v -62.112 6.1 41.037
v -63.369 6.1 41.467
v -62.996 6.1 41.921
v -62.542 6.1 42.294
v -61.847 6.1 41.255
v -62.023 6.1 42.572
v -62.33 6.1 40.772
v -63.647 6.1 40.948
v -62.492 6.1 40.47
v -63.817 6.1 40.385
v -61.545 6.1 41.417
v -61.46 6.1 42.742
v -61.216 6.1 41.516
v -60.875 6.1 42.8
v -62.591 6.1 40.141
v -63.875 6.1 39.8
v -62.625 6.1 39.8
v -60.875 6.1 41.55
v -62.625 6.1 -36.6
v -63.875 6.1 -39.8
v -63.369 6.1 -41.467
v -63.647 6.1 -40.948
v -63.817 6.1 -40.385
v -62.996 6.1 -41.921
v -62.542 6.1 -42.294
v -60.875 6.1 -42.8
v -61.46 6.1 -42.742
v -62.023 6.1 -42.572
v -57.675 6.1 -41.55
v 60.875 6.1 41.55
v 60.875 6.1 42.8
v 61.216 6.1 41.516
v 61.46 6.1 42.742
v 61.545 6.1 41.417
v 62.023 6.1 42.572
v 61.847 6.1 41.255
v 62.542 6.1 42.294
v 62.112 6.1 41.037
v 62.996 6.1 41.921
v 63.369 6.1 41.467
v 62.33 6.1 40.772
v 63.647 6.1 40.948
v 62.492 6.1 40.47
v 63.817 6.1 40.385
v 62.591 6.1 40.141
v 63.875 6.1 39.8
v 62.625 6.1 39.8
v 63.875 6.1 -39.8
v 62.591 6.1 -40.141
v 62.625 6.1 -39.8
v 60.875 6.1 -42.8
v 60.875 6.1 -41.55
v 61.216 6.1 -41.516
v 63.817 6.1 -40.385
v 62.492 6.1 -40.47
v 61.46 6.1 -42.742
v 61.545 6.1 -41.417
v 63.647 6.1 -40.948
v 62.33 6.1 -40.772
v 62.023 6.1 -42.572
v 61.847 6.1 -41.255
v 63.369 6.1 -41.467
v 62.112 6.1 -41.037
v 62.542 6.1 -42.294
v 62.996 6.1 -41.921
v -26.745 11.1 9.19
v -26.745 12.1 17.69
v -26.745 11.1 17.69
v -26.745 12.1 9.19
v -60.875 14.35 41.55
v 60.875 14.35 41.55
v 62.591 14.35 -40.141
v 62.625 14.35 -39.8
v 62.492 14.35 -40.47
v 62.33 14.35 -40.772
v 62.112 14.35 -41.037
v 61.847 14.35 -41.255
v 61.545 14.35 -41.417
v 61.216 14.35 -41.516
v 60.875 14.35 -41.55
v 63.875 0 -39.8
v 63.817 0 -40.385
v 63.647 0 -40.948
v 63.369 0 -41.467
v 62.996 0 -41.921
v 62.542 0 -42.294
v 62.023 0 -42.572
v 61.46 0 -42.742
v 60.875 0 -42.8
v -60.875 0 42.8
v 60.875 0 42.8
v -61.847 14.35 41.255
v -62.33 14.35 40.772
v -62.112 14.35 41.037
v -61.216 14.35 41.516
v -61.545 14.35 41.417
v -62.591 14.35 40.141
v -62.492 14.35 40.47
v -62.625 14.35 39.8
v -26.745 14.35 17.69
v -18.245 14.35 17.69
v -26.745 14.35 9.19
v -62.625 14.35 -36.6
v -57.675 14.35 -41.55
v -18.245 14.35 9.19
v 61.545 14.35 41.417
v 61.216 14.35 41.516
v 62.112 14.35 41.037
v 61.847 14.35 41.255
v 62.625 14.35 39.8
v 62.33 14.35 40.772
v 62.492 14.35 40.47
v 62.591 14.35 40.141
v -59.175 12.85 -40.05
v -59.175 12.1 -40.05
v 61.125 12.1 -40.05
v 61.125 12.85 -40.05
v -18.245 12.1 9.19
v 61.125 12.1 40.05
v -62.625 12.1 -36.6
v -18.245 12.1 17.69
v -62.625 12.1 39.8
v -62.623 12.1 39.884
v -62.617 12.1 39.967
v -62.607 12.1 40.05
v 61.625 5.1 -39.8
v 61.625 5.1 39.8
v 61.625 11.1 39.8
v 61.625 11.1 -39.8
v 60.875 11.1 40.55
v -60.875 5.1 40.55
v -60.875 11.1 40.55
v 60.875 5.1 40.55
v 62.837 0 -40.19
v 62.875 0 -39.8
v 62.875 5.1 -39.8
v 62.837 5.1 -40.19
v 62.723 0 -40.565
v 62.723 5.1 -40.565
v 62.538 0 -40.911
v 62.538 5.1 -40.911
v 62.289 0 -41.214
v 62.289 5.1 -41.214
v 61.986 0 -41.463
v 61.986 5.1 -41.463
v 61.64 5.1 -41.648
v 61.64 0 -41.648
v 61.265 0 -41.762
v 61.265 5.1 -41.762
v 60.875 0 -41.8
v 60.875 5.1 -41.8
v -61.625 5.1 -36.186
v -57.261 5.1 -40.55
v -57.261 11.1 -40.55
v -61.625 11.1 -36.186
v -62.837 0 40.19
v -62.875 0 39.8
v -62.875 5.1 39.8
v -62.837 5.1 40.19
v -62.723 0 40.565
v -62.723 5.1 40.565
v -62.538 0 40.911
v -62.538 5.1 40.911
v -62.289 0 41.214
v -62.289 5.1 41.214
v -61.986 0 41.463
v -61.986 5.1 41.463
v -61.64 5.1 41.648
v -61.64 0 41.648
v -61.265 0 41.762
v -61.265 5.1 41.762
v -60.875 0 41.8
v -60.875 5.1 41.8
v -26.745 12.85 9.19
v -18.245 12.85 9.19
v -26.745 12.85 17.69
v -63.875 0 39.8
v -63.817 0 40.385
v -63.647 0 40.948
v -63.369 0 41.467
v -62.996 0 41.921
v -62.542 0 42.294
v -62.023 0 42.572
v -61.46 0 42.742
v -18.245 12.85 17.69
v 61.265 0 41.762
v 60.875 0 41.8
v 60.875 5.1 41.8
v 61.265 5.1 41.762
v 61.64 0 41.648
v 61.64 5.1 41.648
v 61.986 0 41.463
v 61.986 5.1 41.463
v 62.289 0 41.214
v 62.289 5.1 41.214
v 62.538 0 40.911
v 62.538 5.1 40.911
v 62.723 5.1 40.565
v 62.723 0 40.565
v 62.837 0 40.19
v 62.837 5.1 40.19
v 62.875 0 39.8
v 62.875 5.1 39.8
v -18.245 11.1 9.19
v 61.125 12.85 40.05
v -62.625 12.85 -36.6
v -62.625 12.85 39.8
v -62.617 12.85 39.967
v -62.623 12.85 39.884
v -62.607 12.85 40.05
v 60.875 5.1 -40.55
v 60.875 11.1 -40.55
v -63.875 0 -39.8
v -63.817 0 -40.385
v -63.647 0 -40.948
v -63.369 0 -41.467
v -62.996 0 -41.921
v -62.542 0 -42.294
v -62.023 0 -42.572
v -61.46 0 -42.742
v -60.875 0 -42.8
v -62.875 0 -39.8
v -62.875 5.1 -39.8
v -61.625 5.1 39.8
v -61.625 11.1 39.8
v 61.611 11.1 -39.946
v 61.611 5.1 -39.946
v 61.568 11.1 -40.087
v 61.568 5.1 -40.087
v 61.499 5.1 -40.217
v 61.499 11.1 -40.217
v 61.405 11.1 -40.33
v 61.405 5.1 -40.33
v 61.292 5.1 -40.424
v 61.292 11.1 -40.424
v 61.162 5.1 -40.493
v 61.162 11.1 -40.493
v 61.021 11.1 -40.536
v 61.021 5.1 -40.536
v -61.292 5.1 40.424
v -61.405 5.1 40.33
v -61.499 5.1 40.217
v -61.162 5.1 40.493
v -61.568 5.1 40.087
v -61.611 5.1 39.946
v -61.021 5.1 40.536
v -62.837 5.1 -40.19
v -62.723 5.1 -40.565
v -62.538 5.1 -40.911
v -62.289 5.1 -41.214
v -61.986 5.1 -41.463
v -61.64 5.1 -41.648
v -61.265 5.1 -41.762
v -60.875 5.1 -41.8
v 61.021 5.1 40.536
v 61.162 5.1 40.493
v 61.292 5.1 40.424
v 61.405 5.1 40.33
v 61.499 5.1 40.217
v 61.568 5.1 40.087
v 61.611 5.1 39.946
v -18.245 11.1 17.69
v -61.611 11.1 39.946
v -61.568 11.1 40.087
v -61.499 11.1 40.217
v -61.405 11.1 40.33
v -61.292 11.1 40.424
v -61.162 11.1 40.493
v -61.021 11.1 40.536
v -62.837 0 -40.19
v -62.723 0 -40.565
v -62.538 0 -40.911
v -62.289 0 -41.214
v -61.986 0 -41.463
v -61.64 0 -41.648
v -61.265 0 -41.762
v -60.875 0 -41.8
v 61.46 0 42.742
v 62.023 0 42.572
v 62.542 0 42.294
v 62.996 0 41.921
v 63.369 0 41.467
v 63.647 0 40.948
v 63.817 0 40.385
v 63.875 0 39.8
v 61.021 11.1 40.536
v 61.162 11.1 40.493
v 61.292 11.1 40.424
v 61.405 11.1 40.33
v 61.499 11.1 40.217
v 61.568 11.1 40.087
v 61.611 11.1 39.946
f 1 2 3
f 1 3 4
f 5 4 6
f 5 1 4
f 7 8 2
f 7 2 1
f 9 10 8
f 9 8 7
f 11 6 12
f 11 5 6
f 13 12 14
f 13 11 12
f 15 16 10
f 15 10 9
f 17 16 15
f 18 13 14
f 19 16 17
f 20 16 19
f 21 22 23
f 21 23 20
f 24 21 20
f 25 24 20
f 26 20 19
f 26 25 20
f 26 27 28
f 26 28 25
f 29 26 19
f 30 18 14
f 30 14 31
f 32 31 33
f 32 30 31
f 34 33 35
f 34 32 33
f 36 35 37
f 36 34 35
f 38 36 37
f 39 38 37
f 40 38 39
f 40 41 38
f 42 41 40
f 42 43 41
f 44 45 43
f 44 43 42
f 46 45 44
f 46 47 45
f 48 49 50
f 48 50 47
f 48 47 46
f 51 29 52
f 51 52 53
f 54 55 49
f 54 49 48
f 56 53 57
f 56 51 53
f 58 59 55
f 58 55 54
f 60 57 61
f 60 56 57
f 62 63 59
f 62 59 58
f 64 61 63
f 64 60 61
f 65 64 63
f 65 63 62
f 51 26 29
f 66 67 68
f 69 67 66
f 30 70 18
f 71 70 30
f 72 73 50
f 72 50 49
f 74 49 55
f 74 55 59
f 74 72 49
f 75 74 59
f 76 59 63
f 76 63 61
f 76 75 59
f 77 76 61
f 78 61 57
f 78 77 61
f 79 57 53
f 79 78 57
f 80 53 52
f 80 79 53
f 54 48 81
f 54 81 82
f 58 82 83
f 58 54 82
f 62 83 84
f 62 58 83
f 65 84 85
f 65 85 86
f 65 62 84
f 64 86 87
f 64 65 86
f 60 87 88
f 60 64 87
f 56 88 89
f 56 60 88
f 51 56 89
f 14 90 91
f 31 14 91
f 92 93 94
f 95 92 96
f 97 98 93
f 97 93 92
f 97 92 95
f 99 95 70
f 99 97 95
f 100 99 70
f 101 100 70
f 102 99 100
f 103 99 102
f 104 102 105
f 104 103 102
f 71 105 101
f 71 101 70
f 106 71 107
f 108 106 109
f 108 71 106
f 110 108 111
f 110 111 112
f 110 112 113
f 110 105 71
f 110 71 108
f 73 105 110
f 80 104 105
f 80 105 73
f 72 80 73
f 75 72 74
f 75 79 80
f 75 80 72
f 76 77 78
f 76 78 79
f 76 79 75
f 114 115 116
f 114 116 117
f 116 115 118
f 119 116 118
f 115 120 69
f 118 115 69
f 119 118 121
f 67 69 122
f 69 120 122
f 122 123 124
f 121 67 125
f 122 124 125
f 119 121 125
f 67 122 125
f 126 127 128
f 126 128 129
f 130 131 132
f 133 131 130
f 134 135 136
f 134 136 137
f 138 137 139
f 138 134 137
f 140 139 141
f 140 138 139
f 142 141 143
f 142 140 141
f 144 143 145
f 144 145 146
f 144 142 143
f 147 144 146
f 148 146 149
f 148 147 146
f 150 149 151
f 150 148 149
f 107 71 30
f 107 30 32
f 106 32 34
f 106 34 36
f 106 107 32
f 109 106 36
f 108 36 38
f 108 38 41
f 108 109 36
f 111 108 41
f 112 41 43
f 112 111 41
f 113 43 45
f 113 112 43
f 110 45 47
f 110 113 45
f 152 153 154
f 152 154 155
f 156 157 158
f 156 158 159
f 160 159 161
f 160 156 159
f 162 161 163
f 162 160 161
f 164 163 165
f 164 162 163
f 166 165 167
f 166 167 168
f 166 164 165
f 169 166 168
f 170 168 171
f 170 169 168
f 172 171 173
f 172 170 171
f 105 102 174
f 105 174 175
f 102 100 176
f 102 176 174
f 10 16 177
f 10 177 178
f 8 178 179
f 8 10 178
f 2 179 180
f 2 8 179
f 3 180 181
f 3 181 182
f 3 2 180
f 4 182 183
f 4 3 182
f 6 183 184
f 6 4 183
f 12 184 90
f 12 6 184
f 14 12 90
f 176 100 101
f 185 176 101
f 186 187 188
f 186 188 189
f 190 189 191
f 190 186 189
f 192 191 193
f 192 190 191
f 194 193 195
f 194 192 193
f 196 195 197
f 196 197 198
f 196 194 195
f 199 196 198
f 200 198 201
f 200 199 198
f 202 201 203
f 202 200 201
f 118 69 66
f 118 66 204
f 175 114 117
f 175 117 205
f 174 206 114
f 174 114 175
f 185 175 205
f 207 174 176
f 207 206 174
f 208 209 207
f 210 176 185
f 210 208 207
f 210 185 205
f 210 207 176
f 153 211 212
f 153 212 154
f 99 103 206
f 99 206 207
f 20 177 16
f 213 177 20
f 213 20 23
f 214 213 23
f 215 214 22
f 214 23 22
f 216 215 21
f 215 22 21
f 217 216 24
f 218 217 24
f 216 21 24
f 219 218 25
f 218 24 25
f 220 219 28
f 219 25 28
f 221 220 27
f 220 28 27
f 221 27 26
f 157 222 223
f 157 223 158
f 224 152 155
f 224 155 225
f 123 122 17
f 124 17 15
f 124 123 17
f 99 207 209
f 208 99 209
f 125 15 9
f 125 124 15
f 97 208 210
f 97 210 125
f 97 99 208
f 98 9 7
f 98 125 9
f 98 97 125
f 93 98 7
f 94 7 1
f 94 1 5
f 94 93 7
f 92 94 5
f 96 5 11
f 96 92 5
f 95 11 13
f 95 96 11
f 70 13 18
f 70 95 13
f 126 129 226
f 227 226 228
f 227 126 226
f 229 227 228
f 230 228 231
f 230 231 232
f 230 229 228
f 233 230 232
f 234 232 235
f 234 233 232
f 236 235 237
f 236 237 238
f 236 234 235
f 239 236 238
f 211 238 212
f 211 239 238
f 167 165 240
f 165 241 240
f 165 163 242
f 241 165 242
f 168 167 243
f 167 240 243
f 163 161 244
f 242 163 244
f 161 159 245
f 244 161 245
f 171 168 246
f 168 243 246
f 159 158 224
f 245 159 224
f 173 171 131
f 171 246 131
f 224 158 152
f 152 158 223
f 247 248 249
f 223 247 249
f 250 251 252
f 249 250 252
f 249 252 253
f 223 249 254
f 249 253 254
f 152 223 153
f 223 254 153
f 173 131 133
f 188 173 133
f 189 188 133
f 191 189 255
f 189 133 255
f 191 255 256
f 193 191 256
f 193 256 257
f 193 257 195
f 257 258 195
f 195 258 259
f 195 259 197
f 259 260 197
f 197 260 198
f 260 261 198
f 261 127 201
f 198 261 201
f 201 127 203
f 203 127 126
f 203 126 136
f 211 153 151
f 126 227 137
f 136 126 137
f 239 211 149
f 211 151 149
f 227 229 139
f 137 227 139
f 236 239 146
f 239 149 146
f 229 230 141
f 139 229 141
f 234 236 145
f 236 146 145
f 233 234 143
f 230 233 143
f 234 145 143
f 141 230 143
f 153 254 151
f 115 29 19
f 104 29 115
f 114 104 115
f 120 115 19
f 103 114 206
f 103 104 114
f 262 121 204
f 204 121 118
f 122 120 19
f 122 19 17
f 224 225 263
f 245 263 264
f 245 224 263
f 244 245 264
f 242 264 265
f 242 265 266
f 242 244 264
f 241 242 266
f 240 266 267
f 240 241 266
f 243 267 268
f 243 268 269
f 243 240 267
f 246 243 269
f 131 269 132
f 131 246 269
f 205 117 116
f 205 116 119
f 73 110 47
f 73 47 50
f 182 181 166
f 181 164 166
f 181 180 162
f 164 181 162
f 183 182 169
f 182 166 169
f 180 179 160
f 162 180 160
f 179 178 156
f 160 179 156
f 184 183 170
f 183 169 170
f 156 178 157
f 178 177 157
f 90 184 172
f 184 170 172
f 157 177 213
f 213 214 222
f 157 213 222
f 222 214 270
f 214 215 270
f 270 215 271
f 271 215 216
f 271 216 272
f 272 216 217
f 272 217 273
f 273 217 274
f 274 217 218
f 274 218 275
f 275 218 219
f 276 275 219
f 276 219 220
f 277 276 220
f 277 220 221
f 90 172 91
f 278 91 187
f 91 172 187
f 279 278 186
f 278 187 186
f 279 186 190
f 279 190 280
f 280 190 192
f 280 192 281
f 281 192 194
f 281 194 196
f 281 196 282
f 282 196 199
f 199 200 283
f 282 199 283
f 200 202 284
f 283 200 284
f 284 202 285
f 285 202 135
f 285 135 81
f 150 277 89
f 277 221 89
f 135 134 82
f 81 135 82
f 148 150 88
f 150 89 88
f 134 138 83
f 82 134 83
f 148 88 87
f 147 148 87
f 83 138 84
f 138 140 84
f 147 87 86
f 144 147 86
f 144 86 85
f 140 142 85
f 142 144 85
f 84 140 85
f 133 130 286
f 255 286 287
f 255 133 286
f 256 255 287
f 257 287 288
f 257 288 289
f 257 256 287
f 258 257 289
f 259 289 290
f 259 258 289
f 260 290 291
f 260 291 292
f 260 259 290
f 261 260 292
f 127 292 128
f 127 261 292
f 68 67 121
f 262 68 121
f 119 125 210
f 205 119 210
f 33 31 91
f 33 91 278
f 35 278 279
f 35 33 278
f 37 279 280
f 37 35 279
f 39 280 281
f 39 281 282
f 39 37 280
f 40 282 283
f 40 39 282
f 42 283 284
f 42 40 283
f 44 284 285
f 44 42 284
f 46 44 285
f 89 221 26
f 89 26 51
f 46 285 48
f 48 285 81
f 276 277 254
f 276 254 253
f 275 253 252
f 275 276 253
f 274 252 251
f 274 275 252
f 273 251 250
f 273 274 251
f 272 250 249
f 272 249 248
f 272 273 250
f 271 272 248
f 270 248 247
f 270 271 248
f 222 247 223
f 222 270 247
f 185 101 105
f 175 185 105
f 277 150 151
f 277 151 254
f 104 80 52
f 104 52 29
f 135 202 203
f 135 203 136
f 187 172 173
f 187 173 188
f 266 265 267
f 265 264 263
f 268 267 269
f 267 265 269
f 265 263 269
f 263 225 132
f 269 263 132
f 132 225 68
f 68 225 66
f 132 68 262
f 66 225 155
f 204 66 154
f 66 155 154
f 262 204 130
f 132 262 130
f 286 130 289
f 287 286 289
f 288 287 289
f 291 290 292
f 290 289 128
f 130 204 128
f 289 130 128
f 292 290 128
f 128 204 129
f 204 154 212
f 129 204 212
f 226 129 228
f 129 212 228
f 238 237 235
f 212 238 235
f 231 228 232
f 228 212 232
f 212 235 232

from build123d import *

# Parameters (mm, degrees)
SKETCH1_W           = 127.75
SKETCH1_H           = 85.6
BOSS_EXTRUDE1_DEPTH = 14.35
FILLET1_R           = 3
CUT_FLANGE_DEPTH    = 8.25
SKETCH5_W           = 80.1
SKETCH5_H           = 0.75
CUT_PAPERSLOT_DEPTH = 123.75
SHELL1_DEPTH        = 11.1
SHELL1_2_DEPTH      = 5.1
SKETCH4_W           = 8.5
SKETCH4_H           = 8.5
CUT_EXTRUDE3_DEPTH  = 20


# Read off the part's stored shape, not the designer's step: Shell1
with BuildPart() as part:
    # Sketch1 → Boss-Extrude1 (new body)
    with BuildSketch(Plane(origin=(0, 0, 0), x_dir=(1, 0, 0), z_dir=(0, 1, 0))):
        Rectangle(SKETCH1_W, SKETCH1_H)
    extrude(amount=BOSS_EXTRUDE1_DEPTH)

    # Fillet1
    fillet1_edges = [part.edges().sort_by_distance(p)[0] for p in [
        (-63.875, 7.175, -42.8),
        (63.875, 7.175, -42.8),
        (63.875, 7.175, 42.8),
        (-63.875, 7.175, 42.8),
    ]]
    fillet(fillet1_edges, radius=FILLET1_R)

    # Sketch3 → Cut-Flange (cut)
    with BuildSketch(Plane(origin=(0, 14.35, 0), x_dir=(1, 0, 0), z_dir=(0, 1, 0))):
        with BuildLine():
            Line((-63.875, 39.8), (-63.875, -39.8))
            ThreePointArc((-63.875, -39.8), (-62.996320344, -41.921320344), (-60.875, -42.8))
            Line((-60.875, -42.8), (60.875, -42.8))
            ThreePointArc((60.875, -42.8), (62.996320344, -41.921320344), (63.875, -39.8))
            Line((63.875, -39.8), (63.875, 39.8))
            ThreePointArc((63.875, 39.8), (62.996320344, 41.921320344), (60.875, 42.8))
            Line((60.875, 42.8), (-60.875, 42.8))
            ThreePointArc((-60.875, 42.8), (-62.996320344, 41.921320344), (-63.875, 39.8))
        make_face()
        with BuildLine():
            Line((-62.625, 36.600252532), (-62.625, -39.8))
            ThreePointArc((-62.625, -39.8), (-62.112436867, -41.037436867), (-60.875, -41.55))
            Line((-60.875, -41.55), (60.875, -41.55))
            ThreePointArc((60.875, -41.55), (62.112436867, -41.037436867), (62.625, -39.8))
            Line((62.625, -39.8), (62.625, 39.8))
            ThreePointArc((62.625, 39.8), (62.112436867, 41.037436867), (60.875, 41.55))
            Line((60.875, 41.55), (-57.675252532, 41.55))
            Line((-57.675252532, 41.55), (-62.625, 36.600252532))
        make_face(mode=Mode.SUBTRACT)
    extrude(amount=-CUT_FLANGE_DEPTH, mode=Mode.SUBTRACT)

    # Sketch5 → Cut-PaperSlot (cut)
    with BuildSketch(Plane.ZY.offset(62.625)):
        with Locations((0, 12.475)):
            Rectangle(SKETCH5_W, SKETCH5_H)
    extrude(amount=-CUT_PAPERSLOT_DEPTH, mode=Mode.SUBTRACT)

    # Shell1 outline → Shell1 (cut)
    with BuildSketch(Plane(origin=(0, 0, 0), x_dir=(1, 0, 0), z_dir=(0, 1, 0))):
        with BuildLine():
            Line((-61.625, 36.186038969), (-61.625, -39.8))
            ThreePointArc((-61.625, -39.8), (-61.405330086, -40.330330086), (-60.875, -40.55))
            Line((-60.875, -40.55), (60.875, -40.55))
            ThreePointArc((60.875, -40.55), (61.405330086, -40.330330086), (61.625, -39.8))
            Line((61.625, -39.8), (61.625, 39.8))
            ThreePointArc((61.625, 39.8), (61.405330086, 40.330330086), (60.875, 40.55))
            Line((60.875, 40.55), (-57.261038969, 40.55))
            Line((-57.261038969, 40.55), (-61.625, 36.186038969))
        make_face()
    extrude(amount=SHELL1_DEPTH, mode=Mode.SUBTRACT)

    # Shell1 2 outline → Shell1 2 (cut)
    with BuildSketch(Plane(origin=(0, 0, 0), x_dir=(1, 0, 0), z_dir=(0, 1, 0))):
        with BuildLine():
            Line((-62.875, 39.8), (-62.875, -39.8))
            ThreePointArc((-62.875, -39.8), (-62.289213562, -41.214213562), (-60.875, -41.8))
            Line((-60.875, -41.8), (60.875, -41.8))
            ThreePointArc((60.875, -41.8), (62.289213562, -41.214213562), (62.875, -39.8))
            Line((62.875, -39.8), (62.875, 39.8))
            ThreePointArc((62.875, 39.8), (62.289213562, 41.214213562), (60.875, 41.8))
            Line((60.875, 41.8), (-60.875, 41.8))
            ThreePointArc((-60.875, 41.8), (-62.289213562, 41.214213562), (-62.875, 39.8))
        make_face()
        with BuildLine():
            ThreePointArc((-60.875, -40.55), (-61.405330086, -40.330330086), (-61.625, -39.8))
            Line((-61.625, -39.8), (-61.625, 36.186038969))
            Line((-61.625, 36.186038969), (-57.261038969, 40.55))
            Line((-57.261038969, 40.55), (60.875, 40.55))
            ThreePointArc((60.875, 40.55), (61.405330086, 40.330330086), (61.625, 39.8))
            Line((61.625, 39.8), (61.625, -39.8))
            ThreePointArc((61.625, -39.8), (61.405330086, -40.330330086), (60.875, -40.55))
            Line((60.875, -40.55), (-60.875, -40.55))
        make_face(mode=Mode.SUBTRACT)
    extrude(amount=SHELL1_2_DEPTH, mode=Mode.SUBTRACT)

    # Sketch4 → Cut-Extrude3 (cut)
    with BuildSketch(Plane(origin=(0, 14.35, 0), x_dir=(1, 0, 0), z_dir=(0, 1, 0))):
        with Locations((-22.495, -13.44)):
            Rectangle(SKETCH4_W, SKETCH4_H)
    extrude(amount=-CUT_EXTRUDE3_DEPTH, mode=Mode.SUBTRACT)


solid = part.part
